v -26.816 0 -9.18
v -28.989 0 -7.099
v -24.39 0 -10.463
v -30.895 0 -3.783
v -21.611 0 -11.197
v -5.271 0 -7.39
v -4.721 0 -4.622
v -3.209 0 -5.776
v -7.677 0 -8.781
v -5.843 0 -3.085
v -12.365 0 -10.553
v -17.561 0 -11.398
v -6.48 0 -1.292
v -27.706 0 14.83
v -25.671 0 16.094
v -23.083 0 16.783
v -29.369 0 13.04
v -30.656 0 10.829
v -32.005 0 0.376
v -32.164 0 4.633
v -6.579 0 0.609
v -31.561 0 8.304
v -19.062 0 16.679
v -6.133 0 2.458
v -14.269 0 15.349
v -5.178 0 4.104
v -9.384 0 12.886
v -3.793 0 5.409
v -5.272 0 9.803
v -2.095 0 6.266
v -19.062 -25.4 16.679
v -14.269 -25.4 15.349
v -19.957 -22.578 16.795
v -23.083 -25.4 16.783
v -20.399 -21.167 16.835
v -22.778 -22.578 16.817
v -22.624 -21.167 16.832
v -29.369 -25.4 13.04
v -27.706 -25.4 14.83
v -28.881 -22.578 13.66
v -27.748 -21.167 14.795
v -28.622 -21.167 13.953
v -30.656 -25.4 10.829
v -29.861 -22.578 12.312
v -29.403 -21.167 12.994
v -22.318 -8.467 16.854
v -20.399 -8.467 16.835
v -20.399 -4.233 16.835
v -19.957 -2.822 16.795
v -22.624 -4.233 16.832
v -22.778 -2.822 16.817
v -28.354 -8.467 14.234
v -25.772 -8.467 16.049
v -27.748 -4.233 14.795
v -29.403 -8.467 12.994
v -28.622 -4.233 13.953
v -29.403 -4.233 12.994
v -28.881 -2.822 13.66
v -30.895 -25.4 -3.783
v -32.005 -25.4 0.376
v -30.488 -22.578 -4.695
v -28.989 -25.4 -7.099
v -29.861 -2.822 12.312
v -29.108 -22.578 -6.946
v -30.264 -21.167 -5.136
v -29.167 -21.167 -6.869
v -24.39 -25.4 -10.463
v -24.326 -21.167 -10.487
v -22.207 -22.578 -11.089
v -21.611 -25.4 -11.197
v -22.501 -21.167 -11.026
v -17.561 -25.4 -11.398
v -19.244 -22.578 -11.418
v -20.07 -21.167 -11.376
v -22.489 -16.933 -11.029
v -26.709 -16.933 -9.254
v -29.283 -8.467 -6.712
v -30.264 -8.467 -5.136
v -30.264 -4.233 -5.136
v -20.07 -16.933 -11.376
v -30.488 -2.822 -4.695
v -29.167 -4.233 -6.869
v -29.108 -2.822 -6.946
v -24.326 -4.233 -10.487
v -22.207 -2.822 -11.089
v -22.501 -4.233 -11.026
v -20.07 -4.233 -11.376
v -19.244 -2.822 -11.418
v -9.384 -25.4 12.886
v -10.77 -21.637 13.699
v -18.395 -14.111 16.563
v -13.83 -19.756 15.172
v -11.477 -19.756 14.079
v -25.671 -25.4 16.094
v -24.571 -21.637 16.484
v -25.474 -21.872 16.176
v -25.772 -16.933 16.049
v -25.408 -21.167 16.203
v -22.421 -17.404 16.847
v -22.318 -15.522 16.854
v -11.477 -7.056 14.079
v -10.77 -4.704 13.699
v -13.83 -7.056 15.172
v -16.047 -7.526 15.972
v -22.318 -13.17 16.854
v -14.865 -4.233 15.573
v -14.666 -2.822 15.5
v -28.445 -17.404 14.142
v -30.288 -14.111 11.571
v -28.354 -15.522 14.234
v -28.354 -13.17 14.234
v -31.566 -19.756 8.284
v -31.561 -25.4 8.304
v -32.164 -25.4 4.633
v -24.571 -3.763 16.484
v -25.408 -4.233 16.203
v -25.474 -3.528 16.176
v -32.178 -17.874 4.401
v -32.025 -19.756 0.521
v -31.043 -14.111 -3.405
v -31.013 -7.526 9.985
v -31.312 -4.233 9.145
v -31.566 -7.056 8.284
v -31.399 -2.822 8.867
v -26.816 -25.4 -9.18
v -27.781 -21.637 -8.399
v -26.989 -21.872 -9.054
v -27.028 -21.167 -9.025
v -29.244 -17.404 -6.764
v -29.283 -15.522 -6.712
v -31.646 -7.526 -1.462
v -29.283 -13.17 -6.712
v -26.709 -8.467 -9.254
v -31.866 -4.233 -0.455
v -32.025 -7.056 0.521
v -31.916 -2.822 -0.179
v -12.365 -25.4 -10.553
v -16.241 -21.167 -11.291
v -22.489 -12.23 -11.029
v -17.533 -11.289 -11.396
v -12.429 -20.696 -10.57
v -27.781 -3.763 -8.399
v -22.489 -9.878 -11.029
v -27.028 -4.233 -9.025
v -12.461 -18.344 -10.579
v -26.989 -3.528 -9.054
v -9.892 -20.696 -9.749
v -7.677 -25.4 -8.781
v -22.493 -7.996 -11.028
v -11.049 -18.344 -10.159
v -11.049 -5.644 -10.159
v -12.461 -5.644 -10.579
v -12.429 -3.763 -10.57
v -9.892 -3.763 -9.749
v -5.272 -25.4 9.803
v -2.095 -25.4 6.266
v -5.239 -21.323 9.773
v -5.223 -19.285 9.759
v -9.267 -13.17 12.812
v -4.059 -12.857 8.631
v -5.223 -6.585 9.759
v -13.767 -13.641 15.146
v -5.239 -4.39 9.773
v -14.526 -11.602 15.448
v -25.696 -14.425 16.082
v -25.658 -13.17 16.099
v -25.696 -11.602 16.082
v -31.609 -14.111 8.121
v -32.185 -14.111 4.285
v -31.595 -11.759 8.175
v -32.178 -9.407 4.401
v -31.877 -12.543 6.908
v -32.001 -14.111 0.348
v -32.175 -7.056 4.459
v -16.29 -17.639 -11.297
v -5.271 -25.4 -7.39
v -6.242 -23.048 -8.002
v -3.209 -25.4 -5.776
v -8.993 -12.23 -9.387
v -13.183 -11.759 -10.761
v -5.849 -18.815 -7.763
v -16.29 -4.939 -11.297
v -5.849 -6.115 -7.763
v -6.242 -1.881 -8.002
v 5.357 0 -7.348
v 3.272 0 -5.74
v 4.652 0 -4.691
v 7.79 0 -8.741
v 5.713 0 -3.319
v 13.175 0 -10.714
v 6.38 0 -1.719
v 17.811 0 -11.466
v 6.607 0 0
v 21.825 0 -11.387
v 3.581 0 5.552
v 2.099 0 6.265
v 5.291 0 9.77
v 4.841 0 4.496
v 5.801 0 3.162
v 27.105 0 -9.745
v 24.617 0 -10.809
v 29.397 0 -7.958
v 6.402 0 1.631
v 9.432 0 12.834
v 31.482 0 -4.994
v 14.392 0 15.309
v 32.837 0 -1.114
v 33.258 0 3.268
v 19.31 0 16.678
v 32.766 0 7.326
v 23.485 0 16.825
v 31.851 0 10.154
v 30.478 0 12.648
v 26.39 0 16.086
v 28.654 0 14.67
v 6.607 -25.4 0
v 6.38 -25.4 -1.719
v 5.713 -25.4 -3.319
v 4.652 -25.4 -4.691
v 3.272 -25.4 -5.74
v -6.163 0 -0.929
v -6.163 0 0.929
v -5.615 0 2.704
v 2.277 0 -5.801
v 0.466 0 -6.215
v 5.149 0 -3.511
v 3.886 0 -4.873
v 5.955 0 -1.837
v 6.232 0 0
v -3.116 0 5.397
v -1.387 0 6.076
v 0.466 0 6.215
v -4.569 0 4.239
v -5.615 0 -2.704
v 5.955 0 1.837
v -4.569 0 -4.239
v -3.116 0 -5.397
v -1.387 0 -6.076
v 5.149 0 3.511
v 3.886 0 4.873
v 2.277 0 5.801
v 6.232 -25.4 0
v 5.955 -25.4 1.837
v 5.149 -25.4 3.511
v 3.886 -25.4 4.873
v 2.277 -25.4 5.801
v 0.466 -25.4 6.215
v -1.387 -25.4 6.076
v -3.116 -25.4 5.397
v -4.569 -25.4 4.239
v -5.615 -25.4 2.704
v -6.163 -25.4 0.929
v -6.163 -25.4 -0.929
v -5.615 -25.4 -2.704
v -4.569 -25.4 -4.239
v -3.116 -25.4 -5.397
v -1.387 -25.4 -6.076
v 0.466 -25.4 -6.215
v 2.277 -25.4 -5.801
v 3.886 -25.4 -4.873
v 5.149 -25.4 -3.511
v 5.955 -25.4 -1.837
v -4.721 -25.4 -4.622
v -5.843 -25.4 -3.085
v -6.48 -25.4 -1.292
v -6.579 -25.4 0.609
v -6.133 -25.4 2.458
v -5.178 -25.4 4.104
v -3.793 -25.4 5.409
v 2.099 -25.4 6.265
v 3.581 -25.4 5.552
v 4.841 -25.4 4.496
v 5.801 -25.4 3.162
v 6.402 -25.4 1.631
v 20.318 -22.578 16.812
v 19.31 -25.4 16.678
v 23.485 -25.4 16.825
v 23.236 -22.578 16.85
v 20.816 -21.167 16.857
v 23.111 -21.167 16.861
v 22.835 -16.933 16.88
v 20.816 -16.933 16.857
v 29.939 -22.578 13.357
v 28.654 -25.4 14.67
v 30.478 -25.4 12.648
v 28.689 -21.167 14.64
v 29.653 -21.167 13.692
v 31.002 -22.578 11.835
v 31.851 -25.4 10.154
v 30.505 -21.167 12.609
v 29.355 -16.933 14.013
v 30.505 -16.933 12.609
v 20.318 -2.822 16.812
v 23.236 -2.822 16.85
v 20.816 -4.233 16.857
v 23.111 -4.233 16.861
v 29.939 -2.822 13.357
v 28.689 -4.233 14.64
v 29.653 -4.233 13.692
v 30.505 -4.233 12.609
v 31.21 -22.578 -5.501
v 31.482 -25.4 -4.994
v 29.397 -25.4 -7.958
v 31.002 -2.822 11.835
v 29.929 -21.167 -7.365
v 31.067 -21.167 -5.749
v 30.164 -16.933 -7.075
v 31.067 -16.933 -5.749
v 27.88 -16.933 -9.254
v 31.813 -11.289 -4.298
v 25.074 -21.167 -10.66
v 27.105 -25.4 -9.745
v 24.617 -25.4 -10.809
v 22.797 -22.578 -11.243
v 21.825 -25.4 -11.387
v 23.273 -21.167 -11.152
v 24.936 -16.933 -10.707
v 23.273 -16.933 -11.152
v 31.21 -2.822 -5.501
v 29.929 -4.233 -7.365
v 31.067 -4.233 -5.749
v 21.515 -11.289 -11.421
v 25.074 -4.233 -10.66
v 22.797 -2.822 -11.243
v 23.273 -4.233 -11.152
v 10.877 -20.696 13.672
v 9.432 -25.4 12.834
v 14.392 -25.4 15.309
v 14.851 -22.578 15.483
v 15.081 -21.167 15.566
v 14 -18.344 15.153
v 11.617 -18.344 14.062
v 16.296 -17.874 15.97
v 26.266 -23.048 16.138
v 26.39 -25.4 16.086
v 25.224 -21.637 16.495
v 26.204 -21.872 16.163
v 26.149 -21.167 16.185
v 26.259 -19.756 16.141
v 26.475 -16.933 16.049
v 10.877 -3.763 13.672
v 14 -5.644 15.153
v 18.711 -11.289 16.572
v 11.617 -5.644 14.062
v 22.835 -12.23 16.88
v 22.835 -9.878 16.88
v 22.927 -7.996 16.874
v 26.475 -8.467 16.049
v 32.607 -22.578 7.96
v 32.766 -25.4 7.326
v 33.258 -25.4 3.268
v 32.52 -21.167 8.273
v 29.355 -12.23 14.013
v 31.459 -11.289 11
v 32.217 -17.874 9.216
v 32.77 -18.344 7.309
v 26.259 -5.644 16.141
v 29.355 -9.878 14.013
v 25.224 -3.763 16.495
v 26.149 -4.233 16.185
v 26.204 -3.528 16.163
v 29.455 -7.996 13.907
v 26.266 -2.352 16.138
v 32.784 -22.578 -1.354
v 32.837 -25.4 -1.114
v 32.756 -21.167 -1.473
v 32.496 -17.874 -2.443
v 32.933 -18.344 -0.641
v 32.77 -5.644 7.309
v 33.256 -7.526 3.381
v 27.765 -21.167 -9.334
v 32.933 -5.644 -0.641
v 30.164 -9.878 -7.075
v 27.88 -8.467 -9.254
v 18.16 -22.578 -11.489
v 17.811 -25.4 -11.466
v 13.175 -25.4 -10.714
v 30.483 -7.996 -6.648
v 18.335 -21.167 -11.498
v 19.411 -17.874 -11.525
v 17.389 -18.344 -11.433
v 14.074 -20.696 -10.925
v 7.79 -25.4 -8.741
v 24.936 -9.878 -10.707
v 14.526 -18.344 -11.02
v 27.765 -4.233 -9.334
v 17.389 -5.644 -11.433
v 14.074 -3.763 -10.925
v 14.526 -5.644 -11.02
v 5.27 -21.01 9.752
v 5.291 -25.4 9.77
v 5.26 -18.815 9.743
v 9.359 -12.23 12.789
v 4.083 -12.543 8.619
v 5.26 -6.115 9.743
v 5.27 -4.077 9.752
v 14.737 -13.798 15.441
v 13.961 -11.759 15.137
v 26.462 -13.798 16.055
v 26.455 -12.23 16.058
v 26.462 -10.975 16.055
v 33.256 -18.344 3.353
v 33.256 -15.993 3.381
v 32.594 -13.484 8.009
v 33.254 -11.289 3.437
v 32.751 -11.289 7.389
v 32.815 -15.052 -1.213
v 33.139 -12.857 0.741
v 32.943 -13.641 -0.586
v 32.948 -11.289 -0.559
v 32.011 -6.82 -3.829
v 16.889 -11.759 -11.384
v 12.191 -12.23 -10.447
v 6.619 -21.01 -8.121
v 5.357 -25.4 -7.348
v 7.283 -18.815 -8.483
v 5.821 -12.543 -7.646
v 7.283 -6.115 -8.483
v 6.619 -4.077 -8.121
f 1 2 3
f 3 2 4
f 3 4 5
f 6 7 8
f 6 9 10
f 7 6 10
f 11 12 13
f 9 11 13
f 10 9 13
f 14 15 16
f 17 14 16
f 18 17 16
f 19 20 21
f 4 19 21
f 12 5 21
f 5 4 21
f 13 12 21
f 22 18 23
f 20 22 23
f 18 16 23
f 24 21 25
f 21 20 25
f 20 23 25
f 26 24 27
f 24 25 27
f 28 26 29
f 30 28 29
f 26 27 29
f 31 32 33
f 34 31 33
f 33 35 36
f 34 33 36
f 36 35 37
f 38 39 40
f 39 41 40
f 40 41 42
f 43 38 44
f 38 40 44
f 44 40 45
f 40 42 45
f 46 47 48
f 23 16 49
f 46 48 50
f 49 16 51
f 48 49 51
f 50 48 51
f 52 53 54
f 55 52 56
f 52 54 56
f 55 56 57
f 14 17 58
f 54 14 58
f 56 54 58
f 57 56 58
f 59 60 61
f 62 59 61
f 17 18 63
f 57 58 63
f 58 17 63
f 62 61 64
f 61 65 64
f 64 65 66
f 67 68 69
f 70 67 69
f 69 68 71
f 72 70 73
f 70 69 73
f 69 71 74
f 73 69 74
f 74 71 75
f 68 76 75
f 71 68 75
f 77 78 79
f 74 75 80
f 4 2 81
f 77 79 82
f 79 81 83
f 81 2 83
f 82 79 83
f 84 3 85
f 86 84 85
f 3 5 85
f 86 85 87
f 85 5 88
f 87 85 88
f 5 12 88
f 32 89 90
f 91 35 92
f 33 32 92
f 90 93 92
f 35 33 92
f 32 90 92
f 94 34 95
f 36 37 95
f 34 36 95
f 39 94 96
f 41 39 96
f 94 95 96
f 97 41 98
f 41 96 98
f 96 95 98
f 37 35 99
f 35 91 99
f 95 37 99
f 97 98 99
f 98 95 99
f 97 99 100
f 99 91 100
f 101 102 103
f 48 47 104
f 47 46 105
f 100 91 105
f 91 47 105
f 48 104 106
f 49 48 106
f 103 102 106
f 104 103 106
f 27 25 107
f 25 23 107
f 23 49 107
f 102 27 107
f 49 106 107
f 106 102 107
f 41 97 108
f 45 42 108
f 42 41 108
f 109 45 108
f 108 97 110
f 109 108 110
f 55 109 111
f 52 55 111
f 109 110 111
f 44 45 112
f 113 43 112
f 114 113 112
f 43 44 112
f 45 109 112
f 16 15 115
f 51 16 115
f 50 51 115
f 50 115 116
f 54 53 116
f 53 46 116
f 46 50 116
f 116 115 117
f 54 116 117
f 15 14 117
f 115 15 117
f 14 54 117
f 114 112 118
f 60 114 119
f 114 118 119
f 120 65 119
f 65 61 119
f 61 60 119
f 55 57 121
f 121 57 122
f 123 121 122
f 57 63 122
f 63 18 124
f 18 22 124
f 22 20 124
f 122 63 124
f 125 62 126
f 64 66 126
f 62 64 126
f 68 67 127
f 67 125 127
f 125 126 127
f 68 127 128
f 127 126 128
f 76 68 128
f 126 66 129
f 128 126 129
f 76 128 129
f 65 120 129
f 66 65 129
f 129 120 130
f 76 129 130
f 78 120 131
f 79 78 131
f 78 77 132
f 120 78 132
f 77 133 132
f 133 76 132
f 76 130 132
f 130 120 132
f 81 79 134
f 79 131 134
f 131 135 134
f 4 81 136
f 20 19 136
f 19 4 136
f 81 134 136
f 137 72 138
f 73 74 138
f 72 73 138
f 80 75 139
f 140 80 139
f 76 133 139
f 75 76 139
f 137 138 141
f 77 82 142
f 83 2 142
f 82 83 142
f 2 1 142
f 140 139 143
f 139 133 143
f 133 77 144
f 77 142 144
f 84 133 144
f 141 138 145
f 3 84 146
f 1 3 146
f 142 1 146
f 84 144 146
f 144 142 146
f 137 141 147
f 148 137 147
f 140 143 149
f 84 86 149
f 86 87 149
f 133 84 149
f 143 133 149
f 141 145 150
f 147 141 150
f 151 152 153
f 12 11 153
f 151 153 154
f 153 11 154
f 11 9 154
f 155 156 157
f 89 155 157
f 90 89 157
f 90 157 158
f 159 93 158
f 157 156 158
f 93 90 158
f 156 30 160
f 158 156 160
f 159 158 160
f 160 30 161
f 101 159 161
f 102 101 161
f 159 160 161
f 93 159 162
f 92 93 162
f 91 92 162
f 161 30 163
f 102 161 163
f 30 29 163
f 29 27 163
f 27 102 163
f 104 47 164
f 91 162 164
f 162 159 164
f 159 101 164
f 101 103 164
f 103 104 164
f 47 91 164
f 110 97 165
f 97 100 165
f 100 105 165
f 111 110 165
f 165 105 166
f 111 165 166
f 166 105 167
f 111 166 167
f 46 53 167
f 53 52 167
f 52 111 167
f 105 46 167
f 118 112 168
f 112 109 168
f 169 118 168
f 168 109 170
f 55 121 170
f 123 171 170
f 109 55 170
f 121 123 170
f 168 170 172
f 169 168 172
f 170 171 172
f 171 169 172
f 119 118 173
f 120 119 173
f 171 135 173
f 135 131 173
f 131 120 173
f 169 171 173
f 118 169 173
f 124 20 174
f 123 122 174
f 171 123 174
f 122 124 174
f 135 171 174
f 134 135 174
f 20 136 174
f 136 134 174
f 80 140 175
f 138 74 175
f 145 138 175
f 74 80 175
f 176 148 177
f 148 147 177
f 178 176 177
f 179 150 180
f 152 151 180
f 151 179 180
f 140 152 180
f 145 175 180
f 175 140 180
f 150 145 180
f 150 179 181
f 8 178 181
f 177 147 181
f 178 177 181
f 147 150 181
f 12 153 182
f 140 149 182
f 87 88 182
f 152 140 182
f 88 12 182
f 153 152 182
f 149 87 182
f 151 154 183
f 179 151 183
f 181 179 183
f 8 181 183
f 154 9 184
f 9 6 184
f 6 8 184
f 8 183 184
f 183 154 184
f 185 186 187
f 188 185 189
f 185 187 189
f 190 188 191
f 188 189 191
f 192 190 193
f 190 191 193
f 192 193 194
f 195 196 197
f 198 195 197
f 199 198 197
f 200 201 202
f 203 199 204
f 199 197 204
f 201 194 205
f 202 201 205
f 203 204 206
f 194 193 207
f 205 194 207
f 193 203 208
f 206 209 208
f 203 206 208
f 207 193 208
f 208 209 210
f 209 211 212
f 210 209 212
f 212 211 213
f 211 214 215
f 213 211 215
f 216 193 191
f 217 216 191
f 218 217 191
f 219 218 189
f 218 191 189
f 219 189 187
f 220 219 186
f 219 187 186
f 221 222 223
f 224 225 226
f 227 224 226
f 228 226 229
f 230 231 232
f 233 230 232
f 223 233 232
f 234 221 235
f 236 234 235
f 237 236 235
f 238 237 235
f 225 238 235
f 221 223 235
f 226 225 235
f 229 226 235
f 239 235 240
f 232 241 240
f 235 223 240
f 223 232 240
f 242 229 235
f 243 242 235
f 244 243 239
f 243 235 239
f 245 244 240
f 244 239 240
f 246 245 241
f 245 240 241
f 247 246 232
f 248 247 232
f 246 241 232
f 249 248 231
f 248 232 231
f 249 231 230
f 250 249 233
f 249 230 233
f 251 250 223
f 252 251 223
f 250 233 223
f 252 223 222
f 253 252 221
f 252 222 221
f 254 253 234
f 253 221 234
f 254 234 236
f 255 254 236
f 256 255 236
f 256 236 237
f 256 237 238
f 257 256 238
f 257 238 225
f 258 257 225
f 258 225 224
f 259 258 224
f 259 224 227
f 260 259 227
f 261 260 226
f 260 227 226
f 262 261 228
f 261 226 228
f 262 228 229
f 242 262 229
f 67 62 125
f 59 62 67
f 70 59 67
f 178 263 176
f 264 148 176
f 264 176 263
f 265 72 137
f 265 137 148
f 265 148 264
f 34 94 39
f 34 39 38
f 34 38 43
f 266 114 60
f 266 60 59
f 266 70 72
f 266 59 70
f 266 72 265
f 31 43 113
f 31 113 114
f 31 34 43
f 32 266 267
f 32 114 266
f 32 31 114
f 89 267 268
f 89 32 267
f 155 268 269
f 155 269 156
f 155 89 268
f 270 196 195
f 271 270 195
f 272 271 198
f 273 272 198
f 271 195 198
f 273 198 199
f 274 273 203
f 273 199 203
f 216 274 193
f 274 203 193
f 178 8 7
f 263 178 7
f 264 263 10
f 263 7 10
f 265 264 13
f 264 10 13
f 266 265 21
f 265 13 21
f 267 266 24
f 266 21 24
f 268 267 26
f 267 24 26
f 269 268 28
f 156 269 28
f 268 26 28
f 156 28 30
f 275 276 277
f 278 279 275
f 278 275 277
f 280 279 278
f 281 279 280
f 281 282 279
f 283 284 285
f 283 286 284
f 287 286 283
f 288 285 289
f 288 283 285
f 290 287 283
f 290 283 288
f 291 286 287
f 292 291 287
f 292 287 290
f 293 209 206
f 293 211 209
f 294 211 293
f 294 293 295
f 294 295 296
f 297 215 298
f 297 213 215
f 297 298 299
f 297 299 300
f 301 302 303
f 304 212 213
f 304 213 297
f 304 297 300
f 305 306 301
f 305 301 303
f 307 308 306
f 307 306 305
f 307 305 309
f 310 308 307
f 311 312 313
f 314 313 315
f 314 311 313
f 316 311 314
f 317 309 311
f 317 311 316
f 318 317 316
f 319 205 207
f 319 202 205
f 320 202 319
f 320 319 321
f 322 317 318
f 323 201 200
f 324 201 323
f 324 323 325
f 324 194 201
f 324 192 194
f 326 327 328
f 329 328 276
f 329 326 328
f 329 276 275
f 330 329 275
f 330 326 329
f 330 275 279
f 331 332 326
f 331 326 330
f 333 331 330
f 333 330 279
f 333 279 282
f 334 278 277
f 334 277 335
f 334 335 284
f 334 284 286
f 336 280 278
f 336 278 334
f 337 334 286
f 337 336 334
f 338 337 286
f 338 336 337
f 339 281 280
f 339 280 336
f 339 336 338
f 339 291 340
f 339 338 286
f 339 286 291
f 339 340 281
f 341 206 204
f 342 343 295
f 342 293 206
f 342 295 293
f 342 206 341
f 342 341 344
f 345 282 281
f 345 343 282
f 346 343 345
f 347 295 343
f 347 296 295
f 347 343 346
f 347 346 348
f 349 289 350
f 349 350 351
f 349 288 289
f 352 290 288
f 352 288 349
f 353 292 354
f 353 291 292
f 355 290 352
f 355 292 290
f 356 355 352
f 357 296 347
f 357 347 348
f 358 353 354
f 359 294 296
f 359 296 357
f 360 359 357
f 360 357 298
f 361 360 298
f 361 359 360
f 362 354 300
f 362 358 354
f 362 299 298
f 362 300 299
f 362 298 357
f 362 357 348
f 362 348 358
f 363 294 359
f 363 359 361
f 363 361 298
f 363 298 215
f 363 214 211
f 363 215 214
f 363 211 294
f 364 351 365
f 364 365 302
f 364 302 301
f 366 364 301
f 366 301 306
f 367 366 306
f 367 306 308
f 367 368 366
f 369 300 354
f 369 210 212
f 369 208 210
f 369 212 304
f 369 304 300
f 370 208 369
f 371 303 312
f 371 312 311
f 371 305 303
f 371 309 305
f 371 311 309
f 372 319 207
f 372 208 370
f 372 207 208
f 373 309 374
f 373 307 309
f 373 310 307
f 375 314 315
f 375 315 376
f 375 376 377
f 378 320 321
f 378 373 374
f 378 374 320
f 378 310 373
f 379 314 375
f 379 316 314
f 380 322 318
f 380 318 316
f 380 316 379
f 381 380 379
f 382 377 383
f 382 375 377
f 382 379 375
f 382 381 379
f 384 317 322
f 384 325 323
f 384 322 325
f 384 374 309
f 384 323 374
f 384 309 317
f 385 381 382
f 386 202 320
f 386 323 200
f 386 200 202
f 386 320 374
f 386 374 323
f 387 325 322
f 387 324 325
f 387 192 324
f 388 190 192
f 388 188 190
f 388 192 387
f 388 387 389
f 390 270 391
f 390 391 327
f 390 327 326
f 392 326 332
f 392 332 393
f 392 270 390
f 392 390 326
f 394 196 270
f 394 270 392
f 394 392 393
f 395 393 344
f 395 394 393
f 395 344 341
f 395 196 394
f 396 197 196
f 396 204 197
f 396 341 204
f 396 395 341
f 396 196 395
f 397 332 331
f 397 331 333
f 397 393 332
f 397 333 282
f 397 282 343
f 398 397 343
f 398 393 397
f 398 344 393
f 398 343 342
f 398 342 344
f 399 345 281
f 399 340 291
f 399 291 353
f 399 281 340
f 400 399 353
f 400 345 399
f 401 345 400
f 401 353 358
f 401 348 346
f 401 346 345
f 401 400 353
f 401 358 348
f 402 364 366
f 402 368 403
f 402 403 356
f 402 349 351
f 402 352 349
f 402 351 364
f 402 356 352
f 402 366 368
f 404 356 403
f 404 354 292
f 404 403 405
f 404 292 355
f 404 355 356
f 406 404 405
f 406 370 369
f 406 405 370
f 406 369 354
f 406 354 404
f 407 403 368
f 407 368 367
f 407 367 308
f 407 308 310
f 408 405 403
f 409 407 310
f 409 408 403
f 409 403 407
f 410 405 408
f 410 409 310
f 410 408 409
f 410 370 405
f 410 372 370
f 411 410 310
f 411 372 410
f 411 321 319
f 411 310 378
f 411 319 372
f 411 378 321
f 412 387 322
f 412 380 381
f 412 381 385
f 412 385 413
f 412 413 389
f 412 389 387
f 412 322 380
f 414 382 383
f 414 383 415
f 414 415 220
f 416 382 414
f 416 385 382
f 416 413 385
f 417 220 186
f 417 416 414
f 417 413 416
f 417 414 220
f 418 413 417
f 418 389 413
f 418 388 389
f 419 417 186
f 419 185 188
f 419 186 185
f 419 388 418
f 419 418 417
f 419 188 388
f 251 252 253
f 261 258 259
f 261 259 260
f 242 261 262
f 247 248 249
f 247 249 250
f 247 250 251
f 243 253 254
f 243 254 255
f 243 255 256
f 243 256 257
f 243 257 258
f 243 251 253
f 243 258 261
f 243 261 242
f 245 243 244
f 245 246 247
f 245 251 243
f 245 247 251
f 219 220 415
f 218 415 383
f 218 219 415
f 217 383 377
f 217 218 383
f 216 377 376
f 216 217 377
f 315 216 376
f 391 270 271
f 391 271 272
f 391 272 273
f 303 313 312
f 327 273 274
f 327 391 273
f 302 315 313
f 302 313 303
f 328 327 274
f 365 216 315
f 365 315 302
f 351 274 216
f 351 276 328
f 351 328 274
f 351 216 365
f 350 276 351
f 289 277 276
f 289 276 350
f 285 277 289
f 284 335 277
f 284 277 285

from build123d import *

# Parameters (mm, degrees)
F1_DEPTH = 25.4
F2_R     = 6.2322568569
F3_DEPTH = 25.4


with BuildPart() as f1:
    # F0 (on Front) → F1 (new body)
    with BuildSketch(Plane.XZ):
        with BuildLine():
            ThreePointArc((-3.2085554394, -5.7756240803), (-6.5789241531, 0.6086201709), (-2.0945574764, 6.2662181978))
            add(Edge.make_bspline(
                [(-2.0945574764, 6.2662181978), (-6.9454537614, 13.1970393513), (-33.2427230287, 26.129651708), (-35.0834992847, -16.8059078124), (-8.8469530023, -10.9745129071), (-3.2085554394, -5.7756240803)],
                knots=[0.0798754415, 0.0798754415, 0.0798754415, 0.0798754415, 0.3474462203, 0.6647469506, 0.9175166554, 0.9175166554, 0.9175166554, 0.9175166554], degree=3))
        make_face()
    extrude(amount=F1_DEPTH)


with BuildPart() as f1b:
    # F0 (on Front) → F1, piece 2 (new body)
    with BuildSketch(Plane.XZ):
        with BuildLine():
            ThreePointArc((2.0992928926, 6.2646333392), (5.3629620281, 3.858924696), (6.6070160832, 0))
            ThreePointArc((6.6070160832, 0), (5.7126878884, -3.3193159859), (3.2718165089, -5.7400242383))
            add(Edge.make_bspline(
                [(2.0992928926, 6.2646333392), (7.0386181498, 13.2301181091), (33.934870773, 26.1504942036), (36.5207778926, -16.9839897273), (9.1590263839, -11.0733462711), (3.2718165089, -5.7400242383)],
                knots=[0.0795338053, 0.0795338053, 0.0795338053, 0.0795338053, 0.3473613361, 0.6616357998, 0.9185194836, 0.9185194836, 0.9185194836, 0.9185194836], degree=3))
        make_face()
    extrude(amount=F1_DEPTH)


with BuildPart() as f3:
    # F2 (on Front) → F3 (new body)
    with BuildSketch(Plane.XZ):
        Circle(F2_R)
    extrude(amount=F3_DEPTH)


solid = Compound([f1.part, f1b.part, f3.part])
